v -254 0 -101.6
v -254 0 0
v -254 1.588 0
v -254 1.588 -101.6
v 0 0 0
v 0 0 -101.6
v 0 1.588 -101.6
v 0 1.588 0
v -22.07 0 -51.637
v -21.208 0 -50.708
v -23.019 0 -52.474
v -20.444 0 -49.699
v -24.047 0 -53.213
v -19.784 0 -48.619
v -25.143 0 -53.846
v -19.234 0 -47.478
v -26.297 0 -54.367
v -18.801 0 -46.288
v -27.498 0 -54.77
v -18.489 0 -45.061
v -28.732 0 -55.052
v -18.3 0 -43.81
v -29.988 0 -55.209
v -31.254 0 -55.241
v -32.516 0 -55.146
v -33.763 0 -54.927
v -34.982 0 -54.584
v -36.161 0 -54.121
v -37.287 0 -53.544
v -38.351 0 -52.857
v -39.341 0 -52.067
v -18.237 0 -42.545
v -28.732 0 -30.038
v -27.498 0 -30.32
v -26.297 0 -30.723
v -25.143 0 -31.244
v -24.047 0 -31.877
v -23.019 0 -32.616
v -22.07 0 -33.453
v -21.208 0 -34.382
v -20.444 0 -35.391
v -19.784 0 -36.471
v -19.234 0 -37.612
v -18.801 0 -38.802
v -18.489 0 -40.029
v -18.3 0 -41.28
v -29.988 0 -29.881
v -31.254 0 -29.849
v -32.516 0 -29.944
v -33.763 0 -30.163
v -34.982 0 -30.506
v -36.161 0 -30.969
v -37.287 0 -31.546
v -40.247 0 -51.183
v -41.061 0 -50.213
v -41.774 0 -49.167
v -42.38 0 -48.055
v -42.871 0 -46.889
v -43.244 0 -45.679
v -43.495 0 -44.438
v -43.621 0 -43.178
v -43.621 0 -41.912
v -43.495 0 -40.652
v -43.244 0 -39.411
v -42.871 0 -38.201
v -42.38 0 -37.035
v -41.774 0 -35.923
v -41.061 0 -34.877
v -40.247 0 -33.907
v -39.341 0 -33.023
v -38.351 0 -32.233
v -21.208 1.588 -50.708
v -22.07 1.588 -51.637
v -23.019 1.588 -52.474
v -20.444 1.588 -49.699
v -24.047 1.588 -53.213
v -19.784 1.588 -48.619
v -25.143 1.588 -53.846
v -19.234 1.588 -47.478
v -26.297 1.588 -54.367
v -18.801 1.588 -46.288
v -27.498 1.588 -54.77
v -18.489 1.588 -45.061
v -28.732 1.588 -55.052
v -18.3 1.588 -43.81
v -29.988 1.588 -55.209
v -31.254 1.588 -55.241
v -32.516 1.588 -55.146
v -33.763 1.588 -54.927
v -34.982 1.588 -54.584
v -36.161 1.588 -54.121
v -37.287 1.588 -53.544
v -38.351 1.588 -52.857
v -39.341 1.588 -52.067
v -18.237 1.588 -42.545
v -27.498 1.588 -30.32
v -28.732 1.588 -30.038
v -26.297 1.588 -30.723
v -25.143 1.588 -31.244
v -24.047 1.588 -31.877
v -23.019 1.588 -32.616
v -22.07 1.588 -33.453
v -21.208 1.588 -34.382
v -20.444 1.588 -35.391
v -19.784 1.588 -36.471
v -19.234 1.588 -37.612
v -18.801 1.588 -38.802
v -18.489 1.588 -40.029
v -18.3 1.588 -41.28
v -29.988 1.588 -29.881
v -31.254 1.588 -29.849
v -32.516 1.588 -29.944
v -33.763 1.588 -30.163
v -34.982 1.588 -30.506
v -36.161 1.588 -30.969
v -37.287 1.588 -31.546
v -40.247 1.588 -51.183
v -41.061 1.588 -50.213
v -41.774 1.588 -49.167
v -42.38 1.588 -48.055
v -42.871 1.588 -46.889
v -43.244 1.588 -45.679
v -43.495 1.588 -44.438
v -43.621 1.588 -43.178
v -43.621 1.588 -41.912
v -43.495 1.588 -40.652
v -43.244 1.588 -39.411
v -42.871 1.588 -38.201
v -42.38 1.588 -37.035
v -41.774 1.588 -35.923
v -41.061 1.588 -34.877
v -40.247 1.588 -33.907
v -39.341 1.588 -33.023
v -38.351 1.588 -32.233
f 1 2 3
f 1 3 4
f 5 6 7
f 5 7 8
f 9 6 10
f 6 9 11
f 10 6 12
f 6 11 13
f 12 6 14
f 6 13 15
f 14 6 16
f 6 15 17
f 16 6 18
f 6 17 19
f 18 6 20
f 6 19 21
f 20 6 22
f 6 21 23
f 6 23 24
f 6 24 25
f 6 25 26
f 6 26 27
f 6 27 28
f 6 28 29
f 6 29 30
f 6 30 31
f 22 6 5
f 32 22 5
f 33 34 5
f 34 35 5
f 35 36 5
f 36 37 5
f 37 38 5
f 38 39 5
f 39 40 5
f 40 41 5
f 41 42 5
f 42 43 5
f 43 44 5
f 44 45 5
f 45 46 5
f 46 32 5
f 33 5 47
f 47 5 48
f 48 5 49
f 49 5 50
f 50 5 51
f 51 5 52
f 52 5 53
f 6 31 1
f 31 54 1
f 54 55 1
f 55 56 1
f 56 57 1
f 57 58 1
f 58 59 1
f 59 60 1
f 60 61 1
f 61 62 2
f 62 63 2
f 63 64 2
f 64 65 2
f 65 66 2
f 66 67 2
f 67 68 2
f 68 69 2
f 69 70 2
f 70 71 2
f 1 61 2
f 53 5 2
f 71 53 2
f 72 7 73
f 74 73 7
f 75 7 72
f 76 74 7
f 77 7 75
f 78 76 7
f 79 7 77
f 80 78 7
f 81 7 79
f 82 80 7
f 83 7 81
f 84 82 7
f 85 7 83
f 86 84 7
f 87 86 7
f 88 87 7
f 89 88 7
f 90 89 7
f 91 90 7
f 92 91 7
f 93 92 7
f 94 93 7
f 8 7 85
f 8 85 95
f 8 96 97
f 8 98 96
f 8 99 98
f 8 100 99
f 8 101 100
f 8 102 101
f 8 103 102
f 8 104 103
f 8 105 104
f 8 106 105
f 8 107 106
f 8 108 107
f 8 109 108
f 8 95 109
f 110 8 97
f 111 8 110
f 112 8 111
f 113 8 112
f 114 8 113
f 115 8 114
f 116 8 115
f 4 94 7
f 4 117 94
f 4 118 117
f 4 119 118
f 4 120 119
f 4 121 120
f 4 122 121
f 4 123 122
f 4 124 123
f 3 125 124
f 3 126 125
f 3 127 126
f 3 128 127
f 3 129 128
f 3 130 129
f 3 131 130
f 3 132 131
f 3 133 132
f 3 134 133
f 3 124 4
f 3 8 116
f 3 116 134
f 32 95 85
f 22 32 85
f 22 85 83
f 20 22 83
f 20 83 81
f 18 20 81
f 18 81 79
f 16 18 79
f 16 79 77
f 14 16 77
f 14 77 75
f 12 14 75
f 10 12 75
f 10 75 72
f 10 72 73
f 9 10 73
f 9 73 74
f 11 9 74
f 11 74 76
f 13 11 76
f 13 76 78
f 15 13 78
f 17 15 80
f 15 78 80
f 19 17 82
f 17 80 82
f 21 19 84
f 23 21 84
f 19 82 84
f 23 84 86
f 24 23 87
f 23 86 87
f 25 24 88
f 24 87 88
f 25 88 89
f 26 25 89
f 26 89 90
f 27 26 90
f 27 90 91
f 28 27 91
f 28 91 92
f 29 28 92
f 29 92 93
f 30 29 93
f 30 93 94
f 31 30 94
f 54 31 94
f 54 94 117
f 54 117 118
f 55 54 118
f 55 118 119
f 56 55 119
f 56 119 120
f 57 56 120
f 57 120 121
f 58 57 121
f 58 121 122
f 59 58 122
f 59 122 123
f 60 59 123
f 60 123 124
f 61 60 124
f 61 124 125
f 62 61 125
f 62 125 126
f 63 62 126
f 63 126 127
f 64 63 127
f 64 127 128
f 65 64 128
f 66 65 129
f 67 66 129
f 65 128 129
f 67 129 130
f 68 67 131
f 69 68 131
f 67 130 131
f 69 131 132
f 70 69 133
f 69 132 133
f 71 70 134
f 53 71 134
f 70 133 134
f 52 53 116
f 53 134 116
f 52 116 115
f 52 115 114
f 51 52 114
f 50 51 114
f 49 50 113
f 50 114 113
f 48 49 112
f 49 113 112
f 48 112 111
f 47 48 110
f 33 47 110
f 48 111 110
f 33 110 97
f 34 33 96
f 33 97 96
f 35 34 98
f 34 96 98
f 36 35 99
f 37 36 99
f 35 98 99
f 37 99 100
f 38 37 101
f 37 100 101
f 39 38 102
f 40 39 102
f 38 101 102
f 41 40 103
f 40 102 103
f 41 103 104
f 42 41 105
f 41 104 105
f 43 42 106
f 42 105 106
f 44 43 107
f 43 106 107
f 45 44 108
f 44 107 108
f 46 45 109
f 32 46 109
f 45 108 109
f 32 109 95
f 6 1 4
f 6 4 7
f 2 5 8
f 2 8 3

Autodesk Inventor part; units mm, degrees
ref_plane "YZ Plane" through (0, 0, 0) normal (1, 0, 0) x (0, 1, 0)
ref_plane "XZ Plane" through (0, 0, 0) normal (0, 1, 0) x (-1, 0, 0)
ref_plane "XY Plane" through (0, 0, 0) normal (0, 0, 1) x (1, 0, 0)
sketch "Sketch1" plane through (0, 0, 0) normal (0, 1, 0) x (-1, 0, 0)
  line L0 (0, 0) -> (254, 0)
  line L1 (254, 0) -> (254, -101.6)
  line L2 (254, -101.6) -> (0, -101.6)
  line L3 (0, -101.6) -> (0, 0)
  dimension "d0" = 254
  dimension "d1" = 101.6
extrude "Extrusion1" add sketch "Sketch1" along normal blind 1.5875
sketch "Sketch2" plane through (0, 1.5875, 0) normal (0, 1, 0) x (1, 0, 0)
  circle A0 centre (-30.9372, 42.545) radius 12.7
  line L0 (0, 101.6) -> (-254, 101.6) projected
  line L1 (0, 0) -> (0, 101.6) projected
  line L2 (-254, 0) -> (0, 0) projected
  dimension "d4" = 25.4
  dimension "d7" = 30.9372
  dimension "d8" = 42.545
extrude "Extrusion2" cut sketch "Sketch2" against normal blind 25.4
properties part number "TSV+Panel"
